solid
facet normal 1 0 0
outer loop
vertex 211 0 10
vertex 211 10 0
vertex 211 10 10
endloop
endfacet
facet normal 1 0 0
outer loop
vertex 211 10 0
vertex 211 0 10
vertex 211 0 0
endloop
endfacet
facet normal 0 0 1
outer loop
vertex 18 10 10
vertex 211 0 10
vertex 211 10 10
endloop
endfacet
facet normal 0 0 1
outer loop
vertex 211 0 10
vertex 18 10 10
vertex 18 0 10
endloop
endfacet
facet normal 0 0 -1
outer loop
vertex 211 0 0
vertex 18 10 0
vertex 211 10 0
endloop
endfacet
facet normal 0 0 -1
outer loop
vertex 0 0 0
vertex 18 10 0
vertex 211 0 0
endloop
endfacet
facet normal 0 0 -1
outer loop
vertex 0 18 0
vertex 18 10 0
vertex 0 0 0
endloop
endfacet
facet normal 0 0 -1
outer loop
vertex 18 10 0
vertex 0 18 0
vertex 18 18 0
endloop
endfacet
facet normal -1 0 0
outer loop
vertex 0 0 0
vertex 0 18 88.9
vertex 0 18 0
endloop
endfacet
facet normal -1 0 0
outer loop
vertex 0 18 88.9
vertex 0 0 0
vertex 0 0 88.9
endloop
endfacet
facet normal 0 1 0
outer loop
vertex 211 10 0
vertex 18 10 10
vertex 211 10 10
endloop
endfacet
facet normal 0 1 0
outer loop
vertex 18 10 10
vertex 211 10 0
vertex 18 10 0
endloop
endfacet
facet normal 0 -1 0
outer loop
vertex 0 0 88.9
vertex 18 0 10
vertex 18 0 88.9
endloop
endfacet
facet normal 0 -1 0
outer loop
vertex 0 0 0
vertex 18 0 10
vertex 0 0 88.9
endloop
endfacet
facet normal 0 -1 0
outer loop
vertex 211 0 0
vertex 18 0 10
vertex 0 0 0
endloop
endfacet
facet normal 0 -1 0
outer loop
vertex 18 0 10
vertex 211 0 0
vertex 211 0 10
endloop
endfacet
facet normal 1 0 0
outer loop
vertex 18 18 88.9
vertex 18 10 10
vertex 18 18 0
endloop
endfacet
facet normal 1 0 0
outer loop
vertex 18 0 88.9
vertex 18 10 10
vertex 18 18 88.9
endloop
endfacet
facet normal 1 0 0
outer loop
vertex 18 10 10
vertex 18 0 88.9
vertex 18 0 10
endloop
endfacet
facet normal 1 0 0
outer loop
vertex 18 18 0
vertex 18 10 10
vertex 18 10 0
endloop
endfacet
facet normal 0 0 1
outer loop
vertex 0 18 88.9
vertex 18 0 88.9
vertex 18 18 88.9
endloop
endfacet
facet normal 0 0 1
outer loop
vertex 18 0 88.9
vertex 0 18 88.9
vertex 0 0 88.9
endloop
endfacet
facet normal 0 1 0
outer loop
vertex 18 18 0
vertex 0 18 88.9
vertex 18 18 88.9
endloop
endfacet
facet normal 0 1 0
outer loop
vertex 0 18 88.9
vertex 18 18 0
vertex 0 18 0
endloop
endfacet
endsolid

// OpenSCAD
module beam(len = 211) { cube([len, 10, 10]); }
module rail(len = undef) { assert(len != undef, "len required"); cube([len, 5, 5]); }
beam(len = 211);
module post(h = 88.9) { cube([18, 18, h]); }   // numeric default, but every caller passes h
post(h = 2 * 44.45);
